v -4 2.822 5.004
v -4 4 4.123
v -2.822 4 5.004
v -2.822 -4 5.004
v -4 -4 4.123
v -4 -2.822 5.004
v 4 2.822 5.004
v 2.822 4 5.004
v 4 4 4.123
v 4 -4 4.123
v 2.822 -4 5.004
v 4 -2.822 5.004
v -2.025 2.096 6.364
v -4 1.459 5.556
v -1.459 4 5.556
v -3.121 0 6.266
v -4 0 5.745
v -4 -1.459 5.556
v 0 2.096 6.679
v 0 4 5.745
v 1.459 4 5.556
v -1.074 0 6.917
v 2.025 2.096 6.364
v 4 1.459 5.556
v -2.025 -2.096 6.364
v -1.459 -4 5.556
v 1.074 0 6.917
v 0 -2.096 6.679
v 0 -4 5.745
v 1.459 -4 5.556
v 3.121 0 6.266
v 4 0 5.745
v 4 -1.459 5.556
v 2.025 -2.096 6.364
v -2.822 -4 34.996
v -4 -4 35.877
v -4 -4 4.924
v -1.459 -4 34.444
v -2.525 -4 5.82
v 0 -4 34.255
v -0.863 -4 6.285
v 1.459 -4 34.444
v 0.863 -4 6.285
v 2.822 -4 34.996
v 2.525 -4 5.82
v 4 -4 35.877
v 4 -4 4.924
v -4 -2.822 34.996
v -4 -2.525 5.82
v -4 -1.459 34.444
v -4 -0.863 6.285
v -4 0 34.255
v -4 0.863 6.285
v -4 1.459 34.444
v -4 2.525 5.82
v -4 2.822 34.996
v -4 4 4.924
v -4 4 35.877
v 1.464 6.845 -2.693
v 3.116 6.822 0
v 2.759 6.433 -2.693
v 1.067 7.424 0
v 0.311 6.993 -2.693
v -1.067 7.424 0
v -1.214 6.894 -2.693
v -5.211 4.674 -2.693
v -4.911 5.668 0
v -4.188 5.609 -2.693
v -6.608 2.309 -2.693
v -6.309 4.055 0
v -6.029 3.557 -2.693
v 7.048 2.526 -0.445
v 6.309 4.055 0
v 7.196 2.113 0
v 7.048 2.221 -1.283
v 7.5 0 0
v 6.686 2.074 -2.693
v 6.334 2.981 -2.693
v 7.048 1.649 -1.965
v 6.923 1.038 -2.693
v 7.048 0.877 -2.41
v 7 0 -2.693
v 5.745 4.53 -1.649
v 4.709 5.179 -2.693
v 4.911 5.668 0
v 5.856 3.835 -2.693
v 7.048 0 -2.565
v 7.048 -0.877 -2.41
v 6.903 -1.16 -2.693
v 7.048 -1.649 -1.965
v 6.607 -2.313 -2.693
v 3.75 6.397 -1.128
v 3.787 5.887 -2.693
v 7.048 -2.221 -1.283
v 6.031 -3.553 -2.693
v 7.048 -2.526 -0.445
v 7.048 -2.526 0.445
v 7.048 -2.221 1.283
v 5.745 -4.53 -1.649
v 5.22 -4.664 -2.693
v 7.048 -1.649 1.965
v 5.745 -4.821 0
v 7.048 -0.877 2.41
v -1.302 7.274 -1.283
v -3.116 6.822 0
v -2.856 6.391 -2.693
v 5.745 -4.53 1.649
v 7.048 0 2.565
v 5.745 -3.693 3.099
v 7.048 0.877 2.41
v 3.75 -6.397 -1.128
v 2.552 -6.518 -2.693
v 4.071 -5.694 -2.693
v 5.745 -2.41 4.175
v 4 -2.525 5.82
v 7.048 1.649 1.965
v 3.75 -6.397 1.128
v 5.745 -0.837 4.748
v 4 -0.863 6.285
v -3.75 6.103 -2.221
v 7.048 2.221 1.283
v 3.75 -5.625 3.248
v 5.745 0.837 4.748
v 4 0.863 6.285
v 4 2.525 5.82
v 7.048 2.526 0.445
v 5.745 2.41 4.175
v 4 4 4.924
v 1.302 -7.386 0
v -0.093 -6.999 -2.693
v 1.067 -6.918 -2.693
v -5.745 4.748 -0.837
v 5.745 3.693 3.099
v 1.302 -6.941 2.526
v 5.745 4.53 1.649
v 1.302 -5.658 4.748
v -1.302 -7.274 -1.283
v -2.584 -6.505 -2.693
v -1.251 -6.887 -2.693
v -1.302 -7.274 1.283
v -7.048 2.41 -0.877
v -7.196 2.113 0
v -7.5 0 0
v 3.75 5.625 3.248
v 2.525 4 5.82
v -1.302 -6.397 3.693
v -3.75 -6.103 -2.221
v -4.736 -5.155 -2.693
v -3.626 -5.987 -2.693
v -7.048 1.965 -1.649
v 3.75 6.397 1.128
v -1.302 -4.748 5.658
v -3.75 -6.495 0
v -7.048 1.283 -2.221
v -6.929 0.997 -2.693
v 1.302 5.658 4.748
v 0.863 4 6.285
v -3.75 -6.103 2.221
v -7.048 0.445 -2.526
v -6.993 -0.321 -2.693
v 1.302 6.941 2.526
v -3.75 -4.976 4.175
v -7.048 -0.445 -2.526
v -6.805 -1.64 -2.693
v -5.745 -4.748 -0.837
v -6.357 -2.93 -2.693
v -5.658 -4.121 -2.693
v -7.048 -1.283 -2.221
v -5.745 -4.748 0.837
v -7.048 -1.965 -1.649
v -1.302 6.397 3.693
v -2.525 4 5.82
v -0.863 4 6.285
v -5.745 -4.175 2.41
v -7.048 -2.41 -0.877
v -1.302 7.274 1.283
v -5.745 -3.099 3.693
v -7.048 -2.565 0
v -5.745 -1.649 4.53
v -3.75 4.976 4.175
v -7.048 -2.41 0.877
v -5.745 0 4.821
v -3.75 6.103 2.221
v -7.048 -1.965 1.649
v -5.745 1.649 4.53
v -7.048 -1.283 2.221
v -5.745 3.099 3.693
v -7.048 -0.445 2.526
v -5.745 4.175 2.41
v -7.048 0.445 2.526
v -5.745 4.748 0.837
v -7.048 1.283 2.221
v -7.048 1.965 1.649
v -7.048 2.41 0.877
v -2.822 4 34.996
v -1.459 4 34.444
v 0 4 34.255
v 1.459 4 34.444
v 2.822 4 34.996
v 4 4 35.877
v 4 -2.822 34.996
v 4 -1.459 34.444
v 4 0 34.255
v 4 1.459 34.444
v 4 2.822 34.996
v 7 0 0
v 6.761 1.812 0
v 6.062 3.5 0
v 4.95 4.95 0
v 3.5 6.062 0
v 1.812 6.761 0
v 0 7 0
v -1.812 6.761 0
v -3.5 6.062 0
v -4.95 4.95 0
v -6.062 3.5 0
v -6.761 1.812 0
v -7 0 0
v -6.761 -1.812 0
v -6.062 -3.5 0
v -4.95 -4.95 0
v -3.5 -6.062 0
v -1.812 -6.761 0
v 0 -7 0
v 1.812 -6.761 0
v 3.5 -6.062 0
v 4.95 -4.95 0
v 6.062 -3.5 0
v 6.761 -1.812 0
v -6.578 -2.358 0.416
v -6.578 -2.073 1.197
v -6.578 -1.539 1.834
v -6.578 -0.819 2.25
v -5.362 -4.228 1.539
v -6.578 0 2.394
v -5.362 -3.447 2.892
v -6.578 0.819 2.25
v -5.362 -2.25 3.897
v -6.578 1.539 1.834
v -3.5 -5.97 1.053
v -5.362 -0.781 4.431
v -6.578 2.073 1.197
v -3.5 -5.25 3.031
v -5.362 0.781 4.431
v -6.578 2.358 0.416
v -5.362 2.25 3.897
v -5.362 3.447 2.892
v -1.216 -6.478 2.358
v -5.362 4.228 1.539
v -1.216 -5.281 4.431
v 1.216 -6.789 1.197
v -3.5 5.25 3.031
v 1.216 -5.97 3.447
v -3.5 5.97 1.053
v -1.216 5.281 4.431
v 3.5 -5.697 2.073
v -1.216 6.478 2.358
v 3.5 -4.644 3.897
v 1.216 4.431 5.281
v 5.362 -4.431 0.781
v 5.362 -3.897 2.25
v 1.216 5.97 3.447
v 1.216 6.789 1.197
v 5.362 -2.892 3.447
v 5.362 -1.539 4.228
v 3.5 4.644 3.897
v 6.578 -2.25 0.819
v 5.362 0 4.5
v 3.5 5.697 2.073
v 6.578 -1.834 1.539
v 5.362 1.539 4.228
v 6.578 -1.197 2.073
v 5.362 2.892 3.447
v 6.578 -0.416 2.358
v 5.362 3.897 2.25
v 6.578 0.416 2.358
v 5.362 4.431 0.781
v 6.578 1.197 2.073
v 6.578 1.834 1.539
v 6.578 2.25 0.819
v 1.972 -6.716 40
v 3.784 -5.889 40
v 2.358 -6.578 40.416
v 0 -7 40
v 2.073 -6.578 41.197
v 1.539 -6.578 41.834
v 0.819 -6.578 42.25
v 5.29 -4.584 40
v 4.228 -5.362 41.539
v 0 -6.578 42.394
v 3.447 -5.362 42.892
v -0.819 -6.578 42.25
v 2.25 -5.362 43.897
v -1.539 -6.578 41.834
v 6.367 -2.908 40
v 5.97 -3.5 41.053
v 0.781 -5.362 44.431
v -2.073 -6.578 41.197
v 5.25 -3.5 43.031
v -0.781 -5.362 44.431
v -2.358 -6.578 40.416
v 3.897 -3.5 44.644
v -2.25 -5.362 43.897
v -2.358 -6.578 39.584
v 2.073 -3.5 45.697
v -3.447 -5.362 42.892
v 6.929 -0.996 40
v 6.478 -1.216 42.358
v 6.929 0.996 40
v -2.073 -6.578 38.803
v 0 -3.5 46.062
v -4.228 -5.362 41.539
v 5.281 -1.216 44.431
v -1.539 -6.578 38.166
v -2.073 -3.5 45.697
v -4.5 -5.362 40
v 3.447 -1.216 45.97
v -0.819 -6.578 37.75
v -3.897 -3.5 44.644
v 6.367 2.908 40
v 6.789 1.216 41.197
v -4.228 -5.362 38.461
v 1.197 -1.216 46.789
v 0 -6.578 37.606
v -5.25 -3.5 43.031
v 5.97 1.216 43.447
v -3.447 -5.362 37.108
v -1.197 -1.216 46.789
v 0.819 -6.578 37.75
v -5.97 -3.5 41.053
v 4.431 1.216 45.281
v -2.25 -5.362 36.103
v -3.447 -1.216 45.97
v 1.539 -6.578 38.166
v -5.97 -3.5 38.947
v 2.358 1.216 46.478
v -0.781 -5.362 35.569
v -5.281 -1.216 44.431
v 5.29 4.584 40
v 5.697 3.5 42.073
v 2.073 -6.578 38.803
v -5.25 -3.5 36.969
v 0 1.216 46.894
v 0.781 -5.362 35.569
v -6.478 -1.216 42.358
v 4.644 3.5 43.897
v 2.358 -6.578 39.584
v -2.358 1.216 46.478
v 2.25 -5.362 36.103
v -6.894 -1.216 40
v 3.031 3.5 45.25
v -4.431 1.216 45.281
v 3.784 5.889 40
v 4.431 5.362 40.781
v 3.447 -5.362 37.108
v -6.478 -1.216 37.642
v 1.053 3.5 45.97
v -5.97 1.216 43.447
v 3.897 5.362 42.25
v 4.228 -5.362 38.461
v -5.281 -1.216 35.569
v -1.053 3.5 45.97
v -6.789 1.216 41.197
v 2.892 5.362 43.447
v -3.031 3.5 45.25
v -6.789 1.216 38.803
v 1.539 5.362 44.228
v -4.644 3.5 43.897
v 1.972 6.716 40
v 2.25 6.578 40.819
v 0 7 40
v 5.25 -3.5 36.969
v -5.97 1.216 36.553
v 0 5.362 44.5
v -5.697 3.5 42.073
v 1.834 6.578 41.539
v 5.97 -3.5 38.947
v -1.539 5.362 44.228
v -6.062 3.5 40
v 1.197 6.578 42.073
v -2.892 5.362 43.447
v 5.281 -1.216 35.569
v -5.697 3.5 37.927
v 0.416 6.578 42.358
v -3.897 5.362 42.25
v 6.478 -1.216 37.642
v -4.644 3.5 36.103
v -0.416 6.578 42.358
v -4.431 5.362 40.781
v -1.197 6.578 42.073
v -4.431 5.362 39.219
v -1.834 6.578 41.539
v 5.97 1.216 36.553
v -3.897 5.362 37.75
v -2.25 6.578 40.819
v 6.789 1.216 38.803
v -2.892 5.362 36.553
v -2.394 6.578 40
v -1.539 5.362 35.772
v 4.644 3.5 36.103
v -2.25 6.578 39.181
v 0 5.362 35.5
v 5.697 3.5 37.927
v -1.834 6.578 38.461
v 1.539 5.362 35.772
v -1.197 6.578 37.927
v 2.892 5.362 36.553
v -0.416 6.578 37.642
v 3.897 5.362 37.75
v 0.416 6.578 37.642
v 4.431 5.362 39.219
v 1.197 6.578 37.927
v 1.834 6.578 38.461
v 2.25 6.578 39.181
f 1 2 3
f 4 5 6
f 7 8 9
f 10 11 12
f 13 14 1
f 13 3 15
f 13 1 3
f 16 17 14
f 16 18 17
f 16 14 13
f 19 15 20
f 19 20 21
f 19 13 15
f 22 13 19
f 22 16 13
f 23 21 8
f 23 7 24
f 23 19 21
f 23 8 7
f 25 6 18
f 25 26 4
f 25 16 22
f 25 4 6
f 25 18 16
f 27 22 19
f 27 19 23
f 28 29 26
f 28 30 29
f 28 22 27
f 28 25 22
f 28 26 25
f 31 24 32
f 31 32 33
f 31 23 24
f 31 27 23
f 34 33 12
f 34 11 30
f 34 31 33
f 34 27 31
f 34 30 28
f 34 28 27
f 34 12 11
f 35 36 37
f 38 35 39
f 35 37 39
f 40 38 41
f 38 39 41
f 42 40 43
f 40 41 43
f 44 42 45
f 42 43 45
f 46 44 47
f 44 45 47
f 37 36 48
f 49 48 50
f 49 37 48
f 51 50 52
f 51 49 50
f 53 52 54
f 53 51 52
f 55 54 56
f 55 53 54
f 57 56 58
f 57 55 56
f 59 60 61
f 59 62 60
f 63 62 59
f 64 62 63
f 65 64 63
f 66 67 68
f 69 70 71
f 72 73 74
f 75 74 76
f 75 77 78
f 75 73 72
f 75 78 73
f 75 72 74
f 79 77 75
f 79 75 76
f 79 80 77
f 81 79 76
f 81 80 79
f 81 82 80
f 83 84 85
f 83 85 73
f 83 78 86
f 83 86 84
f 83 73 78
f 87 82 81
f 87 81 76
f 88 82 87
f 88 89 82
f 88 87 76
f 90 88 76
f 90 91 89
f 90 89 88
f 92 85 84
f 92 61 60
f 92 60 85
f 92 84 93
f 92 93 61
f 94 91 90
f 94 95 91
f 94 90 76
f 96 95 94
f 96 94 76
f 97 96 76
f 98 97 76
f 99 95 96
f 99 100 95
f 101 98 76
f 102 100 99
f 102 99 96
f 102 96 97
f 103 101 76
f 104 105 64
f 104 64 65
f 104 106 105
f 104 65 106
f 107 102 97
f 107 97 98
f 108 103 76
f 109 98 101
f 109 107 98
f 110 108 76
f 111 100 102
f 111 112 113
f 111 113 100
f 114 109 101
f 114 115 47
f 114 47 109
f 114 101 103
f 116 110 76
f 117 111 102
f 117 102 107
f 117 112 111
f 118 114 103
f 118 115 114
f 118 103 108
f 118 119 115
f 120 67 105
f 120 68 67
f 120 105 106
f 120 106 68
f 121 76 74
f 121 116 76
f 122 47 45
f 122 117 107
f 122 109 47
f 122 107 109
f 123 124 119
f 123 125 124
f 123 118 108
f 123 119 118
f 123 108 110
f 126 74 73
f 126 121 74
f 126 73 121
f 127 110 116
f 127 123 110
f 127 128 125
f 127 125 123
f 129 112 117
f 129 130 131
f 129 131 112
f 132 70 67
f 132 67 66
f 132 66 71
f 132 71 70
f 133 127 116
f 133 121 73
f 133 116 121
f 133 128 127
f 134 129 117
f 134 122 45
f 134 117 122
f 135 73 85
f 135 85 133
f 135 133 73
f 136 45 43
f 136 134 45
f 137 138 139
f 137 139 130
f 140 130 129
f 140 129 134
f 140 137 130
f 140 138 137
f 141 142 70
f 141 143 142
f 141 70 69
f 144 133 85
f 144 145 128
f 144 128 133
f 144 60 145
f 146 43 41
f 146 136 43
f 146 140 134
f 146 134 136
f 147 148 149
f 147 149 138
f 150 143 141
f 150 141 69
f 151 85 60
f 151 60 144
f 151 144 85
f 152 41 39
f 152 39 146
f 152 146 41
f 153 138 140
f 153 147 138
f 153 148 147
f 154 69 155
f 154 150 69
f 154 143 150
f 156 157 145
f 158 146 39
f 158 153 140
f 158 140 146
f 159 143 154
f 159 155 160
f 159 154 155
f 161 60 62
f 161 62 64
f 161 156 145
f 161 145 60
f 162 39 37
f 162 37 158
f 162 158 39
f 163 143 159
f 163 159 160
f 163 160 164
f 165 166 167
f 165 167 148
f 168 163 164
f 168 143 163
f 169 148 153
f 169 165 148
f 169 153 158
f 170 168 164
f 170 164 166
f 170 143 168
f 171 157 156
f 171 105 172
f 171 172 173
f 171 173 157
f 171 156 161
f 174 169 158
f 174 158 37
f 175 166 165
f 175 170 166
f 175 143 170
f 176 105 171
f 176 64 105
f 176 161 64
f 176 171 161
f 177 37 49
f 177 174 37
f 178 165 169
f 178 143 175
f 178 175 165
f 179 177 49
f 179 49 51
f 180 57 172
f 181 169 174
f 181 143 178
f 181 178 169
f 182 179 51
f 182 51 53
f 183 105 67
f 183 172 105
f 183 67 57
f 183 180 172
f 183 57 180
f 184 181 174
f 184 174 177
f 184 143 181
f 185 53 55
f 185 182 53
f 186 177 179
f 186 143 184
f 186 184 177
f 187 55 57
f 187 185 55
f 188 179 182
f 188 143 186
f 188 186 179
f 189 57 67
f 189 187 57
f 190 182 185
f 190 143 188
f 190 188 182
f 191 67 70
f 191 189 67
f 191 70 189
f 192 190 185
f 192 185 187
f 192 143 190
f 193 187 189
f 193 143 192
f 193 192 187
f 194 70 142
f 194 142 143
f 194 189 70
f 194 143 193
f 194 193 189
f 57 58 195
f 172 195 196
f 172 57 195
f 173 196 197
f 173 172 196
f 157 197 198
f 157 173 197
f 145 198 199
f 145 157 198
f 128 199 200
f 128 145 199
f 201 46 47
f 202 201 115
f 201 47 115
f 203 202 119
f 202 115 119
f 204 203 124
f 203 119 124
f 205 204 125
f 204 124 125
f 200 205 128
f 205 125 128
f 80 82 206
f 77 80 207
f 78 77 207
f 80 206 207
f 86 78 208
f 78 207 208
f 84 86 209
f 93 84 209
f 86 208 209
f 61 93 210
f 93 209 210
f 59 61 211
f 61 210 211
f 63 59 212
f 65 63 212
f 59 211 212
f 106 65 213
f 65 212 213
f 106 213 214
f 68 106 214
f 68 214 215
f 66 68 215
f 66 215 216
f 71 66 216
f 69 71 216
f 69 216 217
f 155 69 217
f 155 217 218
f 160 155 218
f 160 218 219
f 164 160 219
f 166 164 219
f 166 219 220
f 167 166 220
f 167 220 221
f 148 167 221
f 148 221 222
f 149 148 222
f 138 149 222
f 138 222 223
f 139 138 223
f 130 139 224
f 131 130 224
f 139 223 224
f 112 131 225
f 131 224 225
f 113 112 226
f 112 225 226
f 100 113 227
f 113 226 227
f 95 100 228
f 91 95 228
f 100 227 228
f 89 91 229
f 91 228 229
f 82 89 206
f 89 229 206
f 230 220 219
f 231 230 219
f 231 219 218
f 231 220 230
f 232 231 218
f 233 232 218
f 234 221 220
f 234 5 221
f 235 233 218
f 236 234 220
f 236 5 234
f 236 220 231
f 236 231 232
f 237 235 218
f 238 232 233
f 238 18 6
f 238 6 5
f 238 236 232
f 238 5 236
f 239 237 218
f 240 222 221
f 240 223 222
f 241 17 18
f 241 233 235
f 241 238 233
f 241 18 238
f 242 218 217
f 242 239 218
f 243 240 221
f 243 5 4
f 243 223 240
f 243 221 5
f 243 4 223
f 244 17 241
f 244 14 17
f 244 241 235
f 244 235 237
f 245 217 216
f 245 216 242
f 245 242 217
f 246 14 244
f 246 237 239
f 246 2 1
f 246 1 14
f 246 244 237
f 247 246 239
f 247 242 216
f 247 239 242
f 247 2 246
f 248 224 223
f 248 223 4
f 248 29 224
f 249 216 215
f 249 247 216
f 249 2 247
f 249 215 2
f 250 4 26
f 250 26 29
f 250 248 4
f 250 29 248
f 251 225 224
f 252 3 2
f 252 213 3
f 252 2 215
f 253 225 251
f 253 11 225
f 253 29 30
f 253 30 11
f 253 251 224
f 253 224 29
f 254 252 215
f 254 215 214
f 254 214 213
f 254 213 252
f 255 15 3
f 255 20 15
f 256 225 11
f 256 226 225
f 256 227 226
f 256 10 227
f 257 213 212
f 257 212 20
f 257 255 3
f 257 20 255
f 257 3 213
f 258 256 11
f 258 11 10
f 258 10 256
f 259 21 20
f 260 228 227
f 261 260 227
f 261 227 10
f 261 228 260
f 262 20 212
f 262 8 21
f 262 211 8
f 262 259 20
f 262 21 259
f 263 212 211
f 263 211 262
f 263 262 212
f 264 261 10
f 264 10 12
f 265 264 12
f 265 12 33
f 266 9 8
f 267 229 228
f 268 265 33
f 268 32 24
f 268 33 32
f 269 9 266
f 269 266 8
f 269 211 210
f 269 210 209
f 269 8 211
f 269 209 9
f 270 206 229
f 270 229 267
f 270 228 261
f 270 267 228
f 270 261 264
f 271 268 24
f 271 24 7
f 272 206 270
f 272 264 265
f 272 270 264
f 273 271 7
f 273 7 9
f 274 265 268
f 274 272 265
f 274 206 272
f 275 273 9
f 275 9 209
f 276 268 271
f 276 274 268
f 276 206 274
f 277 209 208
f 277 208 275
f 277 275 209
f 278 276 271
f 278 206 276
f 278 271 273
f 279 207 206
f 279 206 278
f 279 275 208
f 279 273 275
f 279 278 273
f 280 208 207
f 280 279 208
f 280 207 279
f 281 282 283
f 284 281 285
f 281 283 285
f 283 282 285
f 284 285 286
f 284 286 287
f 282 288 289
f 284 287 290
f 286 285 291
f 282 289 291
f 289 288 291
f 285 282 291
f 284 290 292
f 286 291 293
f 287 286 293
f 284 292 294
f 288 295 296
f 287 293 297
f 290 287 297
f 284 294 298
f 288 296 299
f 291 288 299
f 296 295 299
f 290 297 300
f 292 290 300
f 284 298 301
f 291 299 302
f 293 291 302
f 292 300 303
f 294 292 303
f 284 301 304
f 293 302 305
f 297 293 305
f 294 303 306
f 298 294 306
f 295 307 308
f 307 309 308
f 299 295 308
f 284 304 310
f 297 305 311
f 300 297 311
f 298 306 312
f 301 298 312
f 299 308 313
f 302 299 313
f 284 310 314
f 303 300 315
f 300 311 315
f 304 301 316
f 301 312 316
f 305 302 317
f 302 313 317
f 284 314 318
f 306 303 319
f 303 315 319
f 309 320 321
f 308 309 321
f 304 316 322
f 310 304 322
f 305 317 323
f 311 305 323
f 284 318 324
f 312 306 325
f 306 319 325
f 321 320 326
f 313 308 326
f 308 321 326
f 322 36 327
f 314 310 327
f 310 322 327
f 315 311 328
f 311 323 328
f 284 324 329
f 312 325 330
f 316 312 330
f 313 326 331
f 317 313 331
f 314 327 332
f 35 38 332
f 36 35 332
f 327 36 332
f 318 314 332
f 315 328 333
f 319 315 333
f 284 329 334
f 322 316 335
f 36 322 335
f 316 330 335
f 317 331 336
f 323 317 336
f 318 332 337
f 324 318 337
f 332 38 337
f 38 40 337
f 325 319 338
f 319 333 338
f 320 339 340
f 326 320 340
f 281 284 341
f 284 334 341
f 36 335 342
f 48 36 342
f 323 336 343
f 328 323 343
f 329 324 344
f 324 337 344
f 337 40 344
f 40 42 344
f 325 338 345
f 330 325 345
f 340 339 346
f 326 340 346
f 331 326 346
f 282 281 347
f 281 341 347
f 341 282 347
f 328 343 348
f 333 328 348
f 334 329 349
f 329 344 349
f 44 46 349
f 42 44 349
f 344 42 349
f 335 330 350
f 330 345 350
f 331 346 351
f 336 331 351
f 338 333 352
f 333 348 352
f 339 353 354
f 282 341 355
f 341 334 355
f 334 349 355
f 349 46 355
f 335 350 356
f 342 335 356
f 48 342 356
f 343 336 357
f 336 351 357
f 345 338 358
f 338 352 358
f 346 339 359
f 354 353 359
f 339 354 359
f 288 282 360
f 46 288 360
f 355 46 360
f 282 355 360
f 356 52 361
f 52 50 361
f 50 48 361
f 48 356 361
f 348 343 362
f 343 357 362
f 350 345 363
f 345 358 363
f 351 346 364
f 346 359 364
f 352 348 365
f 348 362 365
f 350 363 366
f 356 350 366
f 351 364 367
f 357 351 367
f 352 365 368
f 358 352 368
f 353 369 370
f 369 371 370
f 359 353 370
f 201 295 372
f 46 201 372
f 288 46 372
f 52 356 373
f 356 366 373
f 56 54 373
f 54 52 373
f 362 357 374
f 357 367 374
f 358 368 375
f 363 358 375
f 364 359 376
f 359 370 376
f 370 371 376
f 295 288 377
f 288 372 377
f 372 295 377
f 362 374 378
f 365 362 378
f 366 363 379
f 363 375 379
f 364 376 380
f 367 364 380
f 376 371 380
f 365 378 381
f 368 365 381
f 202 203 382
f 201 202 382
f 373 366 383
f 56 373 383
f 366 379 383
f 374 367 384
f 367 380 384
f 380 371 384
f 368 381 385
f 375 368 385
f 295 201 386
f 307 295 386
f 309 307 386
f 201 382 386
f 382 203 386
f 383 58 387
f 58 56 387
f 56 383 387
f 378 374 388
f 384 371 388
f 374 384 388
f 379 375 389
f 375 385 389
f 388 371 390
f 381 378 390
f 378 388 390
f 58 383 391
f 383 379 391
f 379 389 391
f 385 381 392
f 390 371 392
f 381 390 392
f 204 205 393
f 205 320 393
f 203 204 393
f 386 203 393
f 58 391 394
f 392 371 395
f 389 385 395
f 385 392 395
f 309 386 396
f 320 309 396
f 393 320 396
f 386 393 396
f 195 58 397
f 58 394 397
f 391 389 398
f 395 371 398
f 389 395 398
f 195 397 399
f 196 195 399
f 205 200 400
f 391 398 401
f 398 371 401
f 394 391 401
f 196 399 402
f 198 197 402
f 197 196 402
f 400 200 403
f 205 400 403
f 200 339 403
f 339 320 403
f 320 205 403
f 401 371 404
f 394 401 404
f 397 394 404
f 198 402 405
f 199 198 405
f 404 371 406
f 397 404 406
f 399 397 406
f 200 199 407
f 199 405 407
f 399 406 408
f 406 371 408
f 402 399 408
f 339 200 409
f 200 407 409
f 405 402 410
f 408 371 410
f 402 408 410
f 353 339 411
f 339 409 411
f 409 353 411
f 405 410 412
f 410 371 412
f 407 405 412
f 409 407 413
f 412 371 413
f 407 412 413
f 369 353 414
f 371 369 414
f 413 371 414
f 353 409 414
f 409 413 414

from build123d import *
from build123d import SkipClean  # not in build123d's __all__

# Parameters (mm, degrees)
F2_W     = 8
F2_H     = 8
F3_DEPTH = 40
F4_R     = 7
F5_DEPTH = 7.5
F6_W     = 4
F6_H     = 8
F8_W     = 4
F8_H     = 8


# Not quite as in the source:
# - a feature names something its author has since deleted; it is built from what else it names


with BuildPart() as f1:
    # F0 (on Top) → F1 (revolve)
    with BuildSketch(Plane.XY):
        with BuildLine():
            Line((7, 0), (7.5, 0))
            ThreePointArc((7.5, 0), (0, 7.5), (-7.5, 0))
            Line((-7.5, 0), (-7, 0))
            ThreePointArc((-7, 0), (0, 7), (7, 0))
        make_face()
    revolve(axis=Axis((0, 0, 0), (-1, 0, 0)))

    # F2 (on Top) → F3 (join)
    with BuildSketch(Plane.XY):
        Rectangle(F2_W, F2_H)
    extrude(amount=F3_DEPTH)

    # F4 (on Top) → F5 (cut)
    with BuildSketch(Plane.XY):
        Circle(F4_R)
    extrude(amount=-F5_DEPTH, mode=Mode.SUBTRACT)

    # F6 (on face) → F7 (revolve, cut)
    with BuildSketch(Plane(origin=(0, 0, 0), x_dir=(1, 0, 0), z_dir=(0, 0, -1))):
        with BuildLine():
            ThreePointArc((0, -7), (7, 0), (0, 7))
            Line((0, 7), (0, 4))
            Line((0, 4), (4, 4))
            Line((4, 4), (4, -4))
            Line((4, -4), (0, -4))
            Line((0, -4), (0, -7))
        make_face()
        with Locations((2, 0)):
            Rectangle(F6_W, F6_H)
    with SkipClean():  # cleaning this boolean's faces spoils the solid; the shape is the same uncleaned
        revolve(axis=Axis((0, 0, 0), (0, 1, 0)), mode=Mode.SUBTRACT)

    # F8 (on face) → F9 (revolve)
    with BuildSketch(Plane.XY.offset(40)):
        with BuildLine():
            ThreePointArc((0, -7), (7, 0), (0, 7))
            Line((0, 7), (0, 4))
            Line((0, 4), (4, 4))
            Line((4, 4), (4, -4))
            Line((4, -4), (0, -4))
            Line((0, -4), (0, -7))
        make_face()
        with Locations((2, 0)):
            Rectangle(F8_W, F8_H)
    with SkipClean():  # cleaning this boolean's faces spoils the solid; the shape is the same uncleaned
        revolve(axis=Axis((0, 0, 40), (0, -1, 0)))


solid = f1.part
